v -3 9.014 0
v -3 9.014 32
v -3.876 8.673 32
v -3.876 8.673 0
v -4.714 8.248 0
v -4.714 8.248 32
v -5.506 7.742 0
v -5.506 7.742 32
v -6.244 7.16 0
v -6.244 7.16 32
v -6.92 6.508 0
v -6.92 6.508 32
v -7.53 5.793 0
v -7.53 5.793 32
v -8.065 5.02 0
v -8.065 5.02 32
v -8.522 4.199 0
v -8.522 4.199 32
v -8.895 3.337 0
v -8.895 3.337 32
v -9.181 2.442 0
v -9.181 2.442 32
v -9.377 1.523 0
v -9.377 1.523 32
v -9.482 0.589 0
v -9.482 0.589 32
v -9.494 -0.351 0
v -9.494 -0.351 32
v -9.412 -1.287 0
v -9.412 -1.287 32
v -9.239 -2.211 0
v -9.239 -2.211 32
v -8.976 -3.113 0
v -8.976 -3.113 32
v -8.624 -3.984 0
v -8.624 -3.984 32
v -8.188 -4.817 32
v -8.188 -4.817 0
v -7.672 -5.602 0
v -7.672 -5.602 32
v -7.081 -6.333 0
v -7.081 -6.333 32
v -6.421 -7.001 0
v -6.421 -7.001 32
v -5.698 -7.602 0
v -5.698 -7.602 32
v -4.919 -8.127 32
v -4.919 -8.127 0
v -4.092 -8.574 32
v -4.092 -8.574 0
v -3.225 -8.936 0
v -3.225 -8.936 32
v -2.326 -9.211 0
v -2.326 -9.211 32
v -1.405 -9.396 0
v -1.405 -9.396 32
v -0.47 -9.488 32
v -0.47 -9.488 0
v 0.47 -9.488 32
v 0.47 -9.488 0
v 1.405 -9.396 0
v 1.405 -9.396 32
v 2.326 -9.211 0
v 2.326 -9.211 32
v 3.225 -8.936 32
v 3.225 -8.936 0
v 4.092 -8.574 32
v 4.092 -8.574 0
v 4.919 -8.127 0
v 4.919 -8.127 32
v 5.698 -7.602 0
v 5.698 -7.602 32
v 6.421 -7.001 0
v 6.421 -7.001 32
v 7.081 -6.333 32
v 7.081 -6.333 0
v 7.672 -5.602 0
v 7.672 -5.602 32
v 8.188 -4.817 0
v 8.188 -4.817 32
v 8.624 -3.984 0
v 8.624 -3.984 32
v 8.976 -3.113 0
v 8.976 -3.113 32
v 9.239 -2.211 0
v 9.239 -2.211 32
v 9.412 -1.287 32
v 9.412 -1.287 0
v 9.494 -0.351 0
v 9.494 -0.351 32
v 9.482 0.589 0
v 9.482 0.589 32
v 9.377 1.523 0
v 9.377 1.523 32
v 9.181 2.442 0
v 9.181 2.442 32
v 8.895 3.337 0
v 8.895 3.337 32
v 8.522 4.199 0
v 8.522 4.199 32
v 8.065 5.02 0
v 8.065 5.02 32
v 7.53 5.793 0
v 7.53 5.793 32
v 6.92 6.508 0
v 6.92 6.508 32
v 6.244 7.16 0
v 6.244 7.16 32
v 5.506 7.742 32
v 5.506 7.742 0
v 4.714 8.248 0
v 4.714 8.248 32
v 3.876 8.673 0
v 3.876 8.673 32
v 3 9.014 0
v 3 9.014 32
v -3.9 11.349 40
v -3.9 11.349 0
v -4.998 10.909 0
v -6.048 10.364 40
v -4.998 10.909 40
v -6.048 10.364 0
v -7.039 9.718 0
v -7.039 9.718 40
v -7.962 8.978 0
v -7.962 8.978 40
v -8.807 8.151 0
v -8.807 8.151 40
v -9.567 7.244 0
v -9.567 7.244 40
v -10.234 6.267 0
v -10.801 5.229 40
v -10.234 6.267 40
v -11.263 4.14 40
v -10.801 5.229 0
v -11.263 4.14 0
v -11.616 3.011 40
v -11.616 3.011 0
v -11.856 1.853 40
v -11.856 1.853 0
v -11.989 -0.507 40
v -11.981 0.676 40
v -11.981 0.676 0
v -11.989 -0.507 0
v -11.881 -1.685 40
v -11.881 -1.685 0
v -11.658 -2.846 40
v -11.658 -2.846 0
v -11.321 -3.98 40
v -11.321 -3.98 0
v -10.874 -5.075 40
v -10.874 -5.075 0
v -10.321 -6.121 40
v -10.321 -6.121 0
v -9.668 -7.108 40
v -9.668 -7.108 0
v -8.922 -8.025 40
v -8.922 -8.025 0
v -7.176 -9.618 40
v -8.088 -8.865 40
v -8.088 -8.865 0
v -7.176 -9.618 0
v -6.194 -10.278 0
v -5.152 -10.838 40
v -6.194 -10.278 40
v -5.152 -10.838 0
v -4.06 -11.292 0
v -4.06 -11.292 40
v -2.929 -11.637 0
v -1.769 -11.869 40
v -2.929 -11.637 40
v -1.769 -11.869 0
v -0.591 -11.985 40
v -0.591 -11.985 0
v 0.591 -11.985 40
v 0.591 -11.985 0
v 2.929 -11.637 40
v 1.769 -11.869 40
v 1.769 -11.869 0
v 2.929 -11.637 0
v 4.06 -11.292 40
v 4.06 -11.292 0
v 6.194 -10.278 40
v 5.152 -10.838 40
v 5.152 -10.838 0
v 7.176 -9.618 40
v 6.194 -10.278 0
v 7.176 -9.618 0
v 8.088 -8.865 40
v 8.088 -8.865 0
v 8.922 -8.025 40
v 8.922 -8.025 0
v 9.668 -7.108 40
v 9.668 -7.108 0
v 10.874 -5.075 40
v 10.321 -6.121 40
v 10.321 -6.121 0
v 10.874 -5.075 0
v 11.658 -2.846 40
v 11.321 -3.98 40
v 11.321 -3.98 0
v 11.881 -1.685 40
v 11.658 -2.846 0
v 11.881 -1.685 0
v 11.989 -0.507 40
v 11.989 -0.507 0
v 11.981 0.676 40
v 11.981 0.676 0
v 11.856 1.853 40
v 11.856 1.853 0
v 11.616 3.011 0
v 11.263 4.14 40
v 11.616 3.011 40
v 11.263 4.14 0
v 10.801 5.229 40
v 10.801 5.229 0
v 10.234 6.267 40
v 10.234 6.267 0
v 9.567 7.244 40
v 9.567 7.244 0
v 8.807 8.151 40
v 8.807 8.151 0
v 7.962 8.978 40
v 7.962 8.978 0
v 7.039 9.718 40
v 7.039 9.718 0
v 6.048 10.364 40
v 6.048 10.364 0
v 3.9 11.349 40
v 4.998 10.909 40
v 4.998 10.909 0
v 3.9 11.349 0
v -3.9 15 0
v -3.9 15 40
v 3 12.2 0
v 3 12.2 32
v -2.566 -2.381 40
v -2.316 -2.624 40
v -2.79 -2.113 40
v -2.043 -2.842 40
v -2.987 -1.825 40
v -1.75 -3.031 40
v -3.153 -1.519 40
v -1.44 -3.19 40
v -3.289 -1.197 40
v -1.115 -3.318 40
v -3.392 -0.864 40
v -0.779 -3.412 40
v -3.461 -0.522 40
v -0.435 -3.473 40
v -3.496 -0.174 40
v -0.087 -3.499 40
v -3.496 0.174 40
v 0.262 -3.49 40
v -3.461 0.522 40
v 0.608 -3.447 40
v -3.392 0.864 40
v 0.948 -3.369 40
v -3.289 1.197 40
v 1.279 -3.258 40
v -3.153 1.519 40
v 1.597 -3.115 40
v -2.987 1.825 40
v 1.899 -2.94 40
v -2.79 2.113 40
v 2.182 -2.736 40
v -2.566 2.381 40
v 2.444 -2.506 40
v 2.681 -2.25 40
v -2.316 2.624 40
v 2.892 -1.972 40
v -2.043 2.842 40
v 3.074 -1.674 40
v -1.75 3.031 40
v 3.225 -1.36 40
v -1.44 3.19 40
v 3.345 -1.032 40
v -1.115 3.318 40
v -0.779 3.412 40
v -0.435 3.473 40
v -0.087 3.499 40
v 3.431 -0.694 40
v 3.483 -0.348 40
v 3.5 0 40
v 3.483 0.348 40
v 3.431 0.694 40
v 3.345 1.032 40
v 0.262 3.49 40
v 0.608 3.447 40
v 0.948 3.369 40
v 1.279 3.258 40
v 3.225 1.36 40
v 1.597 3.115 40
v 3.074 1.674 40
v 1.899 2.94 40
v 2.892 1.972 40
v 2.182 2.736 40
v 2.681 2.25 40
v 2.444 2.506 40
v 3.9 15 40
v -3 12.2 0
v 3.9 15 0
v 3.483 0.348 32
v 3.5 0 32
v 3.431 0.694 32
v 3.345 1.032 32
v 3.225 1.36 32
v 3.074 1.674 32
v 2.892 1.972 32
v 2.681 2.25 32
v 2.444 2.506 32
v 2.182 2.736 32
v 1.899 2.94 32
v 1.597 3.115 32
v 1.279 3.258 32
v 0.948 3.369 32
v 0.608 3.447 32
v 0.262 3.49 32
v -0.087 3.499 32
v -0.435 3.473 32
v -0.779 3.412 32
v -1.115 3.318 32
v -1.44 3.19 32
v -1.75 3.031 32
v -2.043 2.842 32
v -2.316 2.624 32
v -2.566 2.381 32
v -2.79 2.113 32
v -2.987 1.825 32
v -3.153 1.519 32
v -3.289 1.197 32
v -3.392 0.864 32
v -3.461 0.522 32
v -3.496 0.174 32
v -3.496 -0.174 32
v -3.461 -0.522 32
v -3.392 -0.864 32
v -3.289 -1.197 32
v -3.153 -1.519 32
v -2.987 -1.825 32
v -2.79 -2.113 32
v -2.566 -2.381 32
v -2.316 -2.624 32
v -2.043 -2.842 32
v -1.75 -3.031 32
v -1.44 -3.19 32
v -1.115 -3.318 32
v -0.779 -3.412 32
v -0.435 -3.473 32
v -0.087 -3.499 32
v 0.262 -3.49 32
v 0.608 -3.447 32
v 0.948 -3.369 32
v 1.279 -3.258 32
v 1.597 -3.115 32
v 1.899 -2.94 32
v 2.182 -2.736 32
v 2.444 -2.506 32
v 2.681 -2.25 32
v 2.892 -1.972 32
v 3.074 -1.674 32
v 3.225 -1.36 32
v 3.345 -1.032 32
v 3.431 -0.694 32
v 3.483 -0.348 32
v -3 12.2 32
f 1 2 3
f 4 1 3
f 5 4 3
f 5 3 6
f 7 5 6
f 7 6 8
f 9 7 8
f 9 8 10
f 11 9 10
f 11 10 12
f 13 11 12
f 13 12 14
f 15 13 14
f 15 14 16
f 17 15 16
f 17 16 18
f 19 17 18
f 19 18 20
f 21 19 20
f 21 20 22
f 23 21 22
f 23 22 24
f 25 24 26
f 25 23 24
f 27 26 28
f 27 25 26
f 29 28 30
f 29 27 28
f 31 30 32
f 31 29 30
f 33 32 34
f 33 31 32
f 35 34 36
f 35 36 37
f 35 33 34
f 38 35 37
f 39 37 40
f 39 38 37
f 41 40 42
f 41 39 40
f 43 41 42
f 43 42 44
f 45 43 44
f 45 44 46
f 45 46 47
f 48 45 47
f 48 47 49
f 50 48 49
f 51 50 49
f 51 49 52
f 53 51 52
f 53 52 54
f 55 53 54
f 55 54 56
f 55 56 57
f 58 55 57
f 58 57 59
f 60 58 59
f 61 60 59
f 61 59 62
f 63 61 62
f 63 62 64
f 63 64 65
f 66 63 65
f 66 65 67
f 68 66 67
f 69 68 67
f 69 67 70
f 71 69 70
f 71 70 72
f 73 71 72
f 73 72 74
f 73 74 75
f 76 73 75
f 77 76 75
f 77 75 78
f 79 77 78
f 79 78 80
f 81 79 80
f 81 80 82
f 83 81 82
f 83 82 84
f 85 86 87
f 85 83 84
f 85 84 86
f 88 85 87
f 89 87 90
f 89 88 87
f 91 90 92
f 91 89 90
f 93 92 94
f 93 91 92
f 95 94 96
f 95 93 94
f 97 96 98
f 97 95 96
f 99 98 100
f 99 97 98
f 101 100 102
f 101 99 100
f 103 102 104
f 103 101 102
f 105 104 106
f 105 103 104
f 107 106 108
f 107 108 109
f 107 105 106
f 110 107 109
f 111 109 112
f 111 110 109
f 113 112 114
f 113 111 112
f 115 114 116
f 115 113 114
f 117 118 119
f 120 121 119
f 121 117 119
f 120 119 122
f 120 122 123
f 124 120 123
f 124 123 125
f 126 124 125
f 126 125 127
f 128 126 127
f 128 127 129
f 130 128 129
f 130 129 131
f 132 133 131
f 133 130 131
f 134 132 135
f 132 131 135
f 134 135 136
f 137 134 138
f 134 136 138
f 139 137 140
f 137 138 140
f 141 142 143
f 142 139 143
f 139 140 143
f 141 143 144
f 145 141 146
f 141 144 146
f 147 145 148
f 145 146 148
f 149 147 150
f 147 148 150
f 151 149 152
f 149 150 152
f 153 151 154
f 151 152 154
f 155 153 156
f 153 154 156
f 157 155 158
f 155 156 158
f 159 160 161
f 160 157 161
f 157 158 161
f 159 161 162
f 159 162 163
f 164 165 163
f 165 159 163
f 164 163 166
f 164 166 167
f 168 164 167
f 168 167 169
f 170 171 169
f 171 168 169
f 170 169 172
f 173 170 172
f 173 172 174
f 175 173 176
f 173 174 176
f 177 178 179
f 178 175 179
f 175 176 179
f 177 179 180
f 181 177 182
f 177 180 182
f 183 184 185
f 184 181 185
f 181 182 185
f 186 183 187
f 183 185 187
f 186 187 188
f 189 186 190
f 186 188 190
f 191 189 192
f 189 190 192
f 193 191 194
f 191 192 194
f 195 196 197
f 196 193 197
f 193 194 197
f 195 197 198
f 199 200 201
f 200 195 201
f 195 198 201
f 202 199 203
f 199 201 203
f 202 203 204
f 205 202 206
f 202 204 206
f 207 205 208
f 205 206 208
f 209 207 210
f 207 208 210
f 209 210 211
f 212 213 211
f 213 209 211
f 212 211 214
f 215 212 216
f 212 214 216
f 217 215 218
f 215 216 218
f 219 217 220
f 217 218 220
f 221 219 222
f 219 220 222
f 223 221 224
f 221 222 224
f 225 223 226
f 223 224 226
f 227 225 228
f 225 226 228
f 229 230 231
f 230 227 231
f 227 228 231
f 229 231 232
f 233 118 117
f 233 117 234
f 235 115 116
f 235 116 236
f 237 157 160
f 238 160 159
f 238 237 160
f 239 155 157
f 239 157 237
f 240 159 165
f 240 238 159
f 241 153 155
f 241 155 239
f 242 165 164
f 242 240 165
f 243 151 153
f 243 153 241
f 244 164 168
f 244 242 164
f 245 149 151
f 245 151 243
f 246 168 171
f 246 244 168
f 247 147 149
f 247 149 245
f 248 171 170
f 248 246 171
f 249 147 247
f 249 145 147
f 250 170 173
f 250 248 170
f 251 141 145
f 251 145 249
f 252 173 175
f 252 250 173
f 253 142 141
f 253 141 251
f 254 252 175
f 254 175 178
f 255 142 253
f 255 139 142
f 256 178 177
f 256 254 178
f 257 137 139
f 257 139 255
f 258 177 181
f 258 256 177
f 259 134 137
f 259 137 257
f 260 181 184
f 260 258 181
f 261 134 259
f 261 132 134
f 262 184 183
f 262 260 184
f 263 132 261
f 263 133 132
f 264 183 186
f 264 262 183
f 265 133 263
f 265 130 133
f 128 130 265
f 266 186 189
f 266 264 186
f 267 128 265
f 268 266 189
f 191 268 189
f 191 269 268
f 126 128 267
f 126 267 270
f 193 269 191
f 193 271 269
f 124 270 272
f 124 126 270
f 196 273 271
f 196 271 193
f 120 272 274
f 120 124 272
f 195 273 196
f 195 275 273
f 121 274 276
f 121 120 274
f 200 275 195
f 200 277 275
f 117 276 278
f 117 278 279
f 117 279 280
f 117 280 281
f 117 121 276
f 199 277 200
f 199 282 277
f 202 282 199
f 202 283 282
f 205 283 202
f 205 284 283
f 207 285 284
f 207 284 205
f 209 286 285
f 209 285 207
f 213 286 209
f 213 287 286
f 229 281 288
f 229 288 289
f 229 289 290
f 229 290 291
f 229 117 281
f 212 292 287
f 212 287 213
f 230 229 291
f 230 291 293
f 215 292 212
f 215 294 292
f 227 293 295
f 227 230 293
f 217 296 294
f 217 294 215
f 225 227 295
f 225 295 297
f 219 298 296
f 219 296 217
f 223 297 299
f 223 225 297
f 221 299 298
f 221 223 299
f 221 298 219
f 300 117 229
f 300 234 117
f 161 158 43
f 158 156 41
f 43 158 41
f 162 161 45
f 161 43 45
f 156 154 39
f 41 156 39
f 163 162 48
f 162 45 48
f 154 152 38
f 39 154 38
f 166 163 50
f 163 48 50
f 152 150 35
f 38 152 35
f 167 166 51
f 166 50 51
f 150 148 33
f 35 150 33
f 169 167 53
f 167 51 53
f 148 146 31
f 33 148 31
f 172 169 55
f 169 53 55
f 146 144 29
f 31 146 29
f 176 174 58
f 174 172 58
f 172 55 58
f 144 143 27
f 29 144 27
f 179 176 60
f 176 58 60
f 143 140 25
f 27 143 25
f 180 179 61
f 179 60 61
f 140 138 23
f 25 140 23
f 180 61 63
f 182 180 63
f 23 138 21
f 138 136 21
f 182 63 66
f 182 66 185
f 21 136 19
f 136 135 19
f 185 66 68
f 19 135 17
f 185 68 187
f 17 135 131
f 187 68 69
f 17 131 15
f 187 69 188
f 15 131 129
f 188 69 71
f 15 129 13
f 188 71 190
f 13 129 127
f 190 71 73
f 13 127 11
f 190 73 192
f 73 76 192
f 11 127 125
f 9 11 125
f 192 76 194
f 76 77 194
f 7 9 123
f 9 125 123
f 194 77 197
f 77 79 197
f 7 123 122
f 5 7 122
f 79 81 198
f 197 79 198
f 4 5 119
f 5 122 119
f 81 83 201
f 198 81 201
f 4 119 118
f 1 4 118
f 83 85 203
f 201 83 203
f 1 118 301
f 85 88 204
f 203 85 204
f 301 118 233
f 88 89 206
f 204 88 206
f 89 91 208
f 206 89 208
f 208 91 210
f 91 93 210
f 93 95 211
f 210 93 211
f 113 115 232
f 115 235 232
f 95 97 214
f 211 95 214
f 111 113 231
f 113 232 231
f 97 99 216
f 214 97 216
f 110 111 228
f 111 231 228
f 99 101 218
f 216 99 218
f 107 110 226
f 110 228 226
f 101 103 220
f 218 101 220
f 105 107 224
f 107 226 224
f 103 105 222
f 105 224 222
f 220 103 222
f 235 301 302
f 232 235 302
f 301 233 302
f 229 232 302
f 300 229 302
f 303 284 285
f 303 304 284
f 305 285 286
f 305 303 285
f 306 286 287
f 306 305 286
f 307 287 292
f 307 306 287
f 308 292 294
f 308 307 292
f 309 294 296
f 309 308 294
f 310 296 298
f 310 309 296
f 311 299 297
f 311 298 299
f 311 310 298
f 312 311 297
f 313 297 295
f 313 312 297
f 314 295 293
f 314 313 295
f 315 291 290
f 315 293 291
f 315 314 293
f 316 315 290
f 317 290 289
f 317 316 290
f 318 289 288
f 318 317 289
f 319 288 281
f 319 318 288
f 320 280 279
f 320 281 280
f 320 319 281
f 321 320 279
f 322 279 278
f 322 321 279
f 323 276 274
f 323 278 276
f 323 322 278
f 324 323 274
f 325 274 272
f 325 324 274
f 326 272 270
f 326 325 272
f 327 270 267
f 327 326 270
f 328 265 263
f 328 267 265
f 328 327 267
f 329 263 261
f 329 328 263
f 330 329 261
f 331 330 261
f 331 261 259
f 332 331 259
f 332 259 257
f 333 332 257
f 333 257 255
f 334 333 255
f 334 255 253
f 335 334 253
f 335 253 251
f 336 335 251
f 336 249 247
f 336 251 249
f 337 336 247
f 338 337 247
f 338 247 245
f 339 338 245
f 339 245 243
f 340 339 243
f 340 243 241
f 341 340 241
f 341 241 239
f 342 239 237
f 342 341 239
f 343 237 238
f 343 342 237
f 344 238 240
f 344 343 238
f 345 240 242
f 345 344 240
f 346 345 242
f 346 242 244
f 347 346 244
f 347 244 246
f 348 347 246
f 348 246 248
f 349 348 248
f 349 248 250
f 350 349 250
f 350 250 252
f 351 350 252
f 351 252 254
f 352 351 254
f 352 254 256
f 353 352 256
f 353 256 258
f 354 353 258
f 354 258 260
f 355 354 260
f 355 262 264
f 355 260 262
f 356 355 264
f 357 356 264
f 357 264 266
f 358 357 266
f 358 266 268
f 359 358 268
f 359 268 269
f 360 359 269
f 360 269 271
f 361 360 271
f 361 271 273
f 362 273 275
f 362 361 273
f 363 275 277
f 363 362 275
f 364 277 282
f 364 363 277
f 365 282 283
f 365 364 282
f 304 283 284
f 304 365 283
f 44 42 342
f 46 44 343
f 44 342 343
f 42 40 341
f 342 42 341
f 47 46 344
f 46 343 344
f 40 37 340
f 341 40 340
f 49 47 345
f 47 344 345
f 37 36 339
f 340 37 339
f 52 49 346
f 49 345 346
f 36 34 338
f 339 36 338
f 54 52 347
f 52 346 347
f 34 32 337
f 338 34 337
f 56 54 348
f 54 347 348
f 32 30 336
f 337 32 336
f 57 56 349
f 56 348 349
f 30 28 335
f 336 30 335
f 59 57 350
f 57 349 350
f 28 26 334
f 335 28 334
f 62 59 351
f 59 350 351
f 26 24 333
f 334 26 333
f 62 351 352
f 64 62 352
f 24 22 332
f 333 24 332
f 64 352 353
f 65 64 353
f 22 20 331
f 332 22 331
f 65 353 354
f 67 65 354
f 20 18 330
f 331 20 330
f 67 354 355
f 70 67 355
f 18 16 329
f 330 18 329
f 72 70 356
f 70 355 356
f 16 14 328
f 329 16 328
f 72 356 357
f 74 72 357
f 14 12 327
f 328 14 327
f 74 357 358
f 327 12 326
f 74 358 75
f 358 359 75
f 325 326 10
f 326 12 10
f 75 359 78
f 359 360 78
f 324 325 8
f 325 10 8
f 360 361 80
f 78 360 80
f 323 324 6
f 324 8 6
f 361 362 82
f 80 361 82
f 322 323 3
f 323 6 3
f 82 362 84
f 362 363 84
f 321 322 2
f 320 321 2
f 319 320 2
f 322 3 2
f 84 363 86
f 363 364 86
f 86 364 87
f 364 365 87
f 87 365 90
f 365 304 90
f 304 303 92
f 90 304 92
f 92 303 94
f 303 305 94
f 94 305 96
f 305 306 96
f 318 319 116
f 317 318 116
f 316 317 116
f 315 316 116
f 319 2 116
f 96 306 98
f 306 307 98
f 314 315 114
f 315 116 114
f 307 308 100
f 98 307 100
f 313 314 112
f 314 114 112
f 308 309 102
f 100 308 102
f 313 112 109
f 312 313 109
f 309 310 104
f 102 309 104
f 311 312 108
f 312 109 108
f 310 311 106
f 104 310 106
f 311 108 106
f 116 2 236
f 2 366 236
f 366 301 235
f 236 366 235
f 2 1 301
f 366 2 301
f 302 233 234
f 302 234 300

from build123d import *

# Parameters (mm, degrees)
ESQUISSE2_R             = 12
BOSS_EXTRU_1_DEPTH      = 40
ESQUISSE3_W             = 7.8
ESQUISSE3_H             = 4.051853135
BOSS_EXTRU_3_DEPTH      = 40
ESQUISSE4_R             = 9.5
ENL_V_MAT_EXTRU_3_DEPTH = 32
ESQUISSE6_W             = 6
ESQUISSE6_H             = 3.848056491
ENL_V_MAT_EXTRU_4_DEPTH = 32
ESQUISSE7_R             = 3.5
ENL_V_MAT_EXTRU_5_DEPTH = 42


with BuildPart() as part:
    # Esquisse2 → Boss.-Extru.1 (new body)
    with BuildSketch(Plane.XY):
        Circle(ESQUISSE2_R)
    extrude(amount=BOSS_EXTRU_1_DEPTH)

    # Esquisse3 → Boss.-Extru.3 (add)
    with BuildSketch(Plane.XY):
        with Locations((0, 12.974073433)):
            Rectangle(ESQUISSE3_W, ESQUISSE3_H)
    extrude(amount=BOSS_EXTRU_3_DEPTH)

    # Esquisse4 → Enlèv. mat.-Extru.3 (cut)
    with BuildSketch(Plane.XY):
        Circle(ESQUISSE4_R)
    extrude(amount=ENL_V_MAT_EXTRU_3_DEPTH, mode=Mode.SUBTRACT)

    # Esquisse6 → Enlèv. mat.-Extru.4 (cut)
    with BuildSketch(Plane.XY):
        with Locations((0, 10.275971755)):
            Rectangle(ESQUISSE6_W, ESQUISSE6_H)
    extrude(amount=ENL_V_MAT_EXTRU_4_DEPTH, mode=Mode.SUBTRACT)

    # Esquisse7 → Enlèv. mat.-Extru.5 (cut)
    with BuildSketch(Plane.XY):
        Circle(ESQUISSE7_R)
    extrude(amount=ENL_V_MAT_EXTRU_5_DEPTH, mode=Mode.SUBTRACT)


solid = part.part
